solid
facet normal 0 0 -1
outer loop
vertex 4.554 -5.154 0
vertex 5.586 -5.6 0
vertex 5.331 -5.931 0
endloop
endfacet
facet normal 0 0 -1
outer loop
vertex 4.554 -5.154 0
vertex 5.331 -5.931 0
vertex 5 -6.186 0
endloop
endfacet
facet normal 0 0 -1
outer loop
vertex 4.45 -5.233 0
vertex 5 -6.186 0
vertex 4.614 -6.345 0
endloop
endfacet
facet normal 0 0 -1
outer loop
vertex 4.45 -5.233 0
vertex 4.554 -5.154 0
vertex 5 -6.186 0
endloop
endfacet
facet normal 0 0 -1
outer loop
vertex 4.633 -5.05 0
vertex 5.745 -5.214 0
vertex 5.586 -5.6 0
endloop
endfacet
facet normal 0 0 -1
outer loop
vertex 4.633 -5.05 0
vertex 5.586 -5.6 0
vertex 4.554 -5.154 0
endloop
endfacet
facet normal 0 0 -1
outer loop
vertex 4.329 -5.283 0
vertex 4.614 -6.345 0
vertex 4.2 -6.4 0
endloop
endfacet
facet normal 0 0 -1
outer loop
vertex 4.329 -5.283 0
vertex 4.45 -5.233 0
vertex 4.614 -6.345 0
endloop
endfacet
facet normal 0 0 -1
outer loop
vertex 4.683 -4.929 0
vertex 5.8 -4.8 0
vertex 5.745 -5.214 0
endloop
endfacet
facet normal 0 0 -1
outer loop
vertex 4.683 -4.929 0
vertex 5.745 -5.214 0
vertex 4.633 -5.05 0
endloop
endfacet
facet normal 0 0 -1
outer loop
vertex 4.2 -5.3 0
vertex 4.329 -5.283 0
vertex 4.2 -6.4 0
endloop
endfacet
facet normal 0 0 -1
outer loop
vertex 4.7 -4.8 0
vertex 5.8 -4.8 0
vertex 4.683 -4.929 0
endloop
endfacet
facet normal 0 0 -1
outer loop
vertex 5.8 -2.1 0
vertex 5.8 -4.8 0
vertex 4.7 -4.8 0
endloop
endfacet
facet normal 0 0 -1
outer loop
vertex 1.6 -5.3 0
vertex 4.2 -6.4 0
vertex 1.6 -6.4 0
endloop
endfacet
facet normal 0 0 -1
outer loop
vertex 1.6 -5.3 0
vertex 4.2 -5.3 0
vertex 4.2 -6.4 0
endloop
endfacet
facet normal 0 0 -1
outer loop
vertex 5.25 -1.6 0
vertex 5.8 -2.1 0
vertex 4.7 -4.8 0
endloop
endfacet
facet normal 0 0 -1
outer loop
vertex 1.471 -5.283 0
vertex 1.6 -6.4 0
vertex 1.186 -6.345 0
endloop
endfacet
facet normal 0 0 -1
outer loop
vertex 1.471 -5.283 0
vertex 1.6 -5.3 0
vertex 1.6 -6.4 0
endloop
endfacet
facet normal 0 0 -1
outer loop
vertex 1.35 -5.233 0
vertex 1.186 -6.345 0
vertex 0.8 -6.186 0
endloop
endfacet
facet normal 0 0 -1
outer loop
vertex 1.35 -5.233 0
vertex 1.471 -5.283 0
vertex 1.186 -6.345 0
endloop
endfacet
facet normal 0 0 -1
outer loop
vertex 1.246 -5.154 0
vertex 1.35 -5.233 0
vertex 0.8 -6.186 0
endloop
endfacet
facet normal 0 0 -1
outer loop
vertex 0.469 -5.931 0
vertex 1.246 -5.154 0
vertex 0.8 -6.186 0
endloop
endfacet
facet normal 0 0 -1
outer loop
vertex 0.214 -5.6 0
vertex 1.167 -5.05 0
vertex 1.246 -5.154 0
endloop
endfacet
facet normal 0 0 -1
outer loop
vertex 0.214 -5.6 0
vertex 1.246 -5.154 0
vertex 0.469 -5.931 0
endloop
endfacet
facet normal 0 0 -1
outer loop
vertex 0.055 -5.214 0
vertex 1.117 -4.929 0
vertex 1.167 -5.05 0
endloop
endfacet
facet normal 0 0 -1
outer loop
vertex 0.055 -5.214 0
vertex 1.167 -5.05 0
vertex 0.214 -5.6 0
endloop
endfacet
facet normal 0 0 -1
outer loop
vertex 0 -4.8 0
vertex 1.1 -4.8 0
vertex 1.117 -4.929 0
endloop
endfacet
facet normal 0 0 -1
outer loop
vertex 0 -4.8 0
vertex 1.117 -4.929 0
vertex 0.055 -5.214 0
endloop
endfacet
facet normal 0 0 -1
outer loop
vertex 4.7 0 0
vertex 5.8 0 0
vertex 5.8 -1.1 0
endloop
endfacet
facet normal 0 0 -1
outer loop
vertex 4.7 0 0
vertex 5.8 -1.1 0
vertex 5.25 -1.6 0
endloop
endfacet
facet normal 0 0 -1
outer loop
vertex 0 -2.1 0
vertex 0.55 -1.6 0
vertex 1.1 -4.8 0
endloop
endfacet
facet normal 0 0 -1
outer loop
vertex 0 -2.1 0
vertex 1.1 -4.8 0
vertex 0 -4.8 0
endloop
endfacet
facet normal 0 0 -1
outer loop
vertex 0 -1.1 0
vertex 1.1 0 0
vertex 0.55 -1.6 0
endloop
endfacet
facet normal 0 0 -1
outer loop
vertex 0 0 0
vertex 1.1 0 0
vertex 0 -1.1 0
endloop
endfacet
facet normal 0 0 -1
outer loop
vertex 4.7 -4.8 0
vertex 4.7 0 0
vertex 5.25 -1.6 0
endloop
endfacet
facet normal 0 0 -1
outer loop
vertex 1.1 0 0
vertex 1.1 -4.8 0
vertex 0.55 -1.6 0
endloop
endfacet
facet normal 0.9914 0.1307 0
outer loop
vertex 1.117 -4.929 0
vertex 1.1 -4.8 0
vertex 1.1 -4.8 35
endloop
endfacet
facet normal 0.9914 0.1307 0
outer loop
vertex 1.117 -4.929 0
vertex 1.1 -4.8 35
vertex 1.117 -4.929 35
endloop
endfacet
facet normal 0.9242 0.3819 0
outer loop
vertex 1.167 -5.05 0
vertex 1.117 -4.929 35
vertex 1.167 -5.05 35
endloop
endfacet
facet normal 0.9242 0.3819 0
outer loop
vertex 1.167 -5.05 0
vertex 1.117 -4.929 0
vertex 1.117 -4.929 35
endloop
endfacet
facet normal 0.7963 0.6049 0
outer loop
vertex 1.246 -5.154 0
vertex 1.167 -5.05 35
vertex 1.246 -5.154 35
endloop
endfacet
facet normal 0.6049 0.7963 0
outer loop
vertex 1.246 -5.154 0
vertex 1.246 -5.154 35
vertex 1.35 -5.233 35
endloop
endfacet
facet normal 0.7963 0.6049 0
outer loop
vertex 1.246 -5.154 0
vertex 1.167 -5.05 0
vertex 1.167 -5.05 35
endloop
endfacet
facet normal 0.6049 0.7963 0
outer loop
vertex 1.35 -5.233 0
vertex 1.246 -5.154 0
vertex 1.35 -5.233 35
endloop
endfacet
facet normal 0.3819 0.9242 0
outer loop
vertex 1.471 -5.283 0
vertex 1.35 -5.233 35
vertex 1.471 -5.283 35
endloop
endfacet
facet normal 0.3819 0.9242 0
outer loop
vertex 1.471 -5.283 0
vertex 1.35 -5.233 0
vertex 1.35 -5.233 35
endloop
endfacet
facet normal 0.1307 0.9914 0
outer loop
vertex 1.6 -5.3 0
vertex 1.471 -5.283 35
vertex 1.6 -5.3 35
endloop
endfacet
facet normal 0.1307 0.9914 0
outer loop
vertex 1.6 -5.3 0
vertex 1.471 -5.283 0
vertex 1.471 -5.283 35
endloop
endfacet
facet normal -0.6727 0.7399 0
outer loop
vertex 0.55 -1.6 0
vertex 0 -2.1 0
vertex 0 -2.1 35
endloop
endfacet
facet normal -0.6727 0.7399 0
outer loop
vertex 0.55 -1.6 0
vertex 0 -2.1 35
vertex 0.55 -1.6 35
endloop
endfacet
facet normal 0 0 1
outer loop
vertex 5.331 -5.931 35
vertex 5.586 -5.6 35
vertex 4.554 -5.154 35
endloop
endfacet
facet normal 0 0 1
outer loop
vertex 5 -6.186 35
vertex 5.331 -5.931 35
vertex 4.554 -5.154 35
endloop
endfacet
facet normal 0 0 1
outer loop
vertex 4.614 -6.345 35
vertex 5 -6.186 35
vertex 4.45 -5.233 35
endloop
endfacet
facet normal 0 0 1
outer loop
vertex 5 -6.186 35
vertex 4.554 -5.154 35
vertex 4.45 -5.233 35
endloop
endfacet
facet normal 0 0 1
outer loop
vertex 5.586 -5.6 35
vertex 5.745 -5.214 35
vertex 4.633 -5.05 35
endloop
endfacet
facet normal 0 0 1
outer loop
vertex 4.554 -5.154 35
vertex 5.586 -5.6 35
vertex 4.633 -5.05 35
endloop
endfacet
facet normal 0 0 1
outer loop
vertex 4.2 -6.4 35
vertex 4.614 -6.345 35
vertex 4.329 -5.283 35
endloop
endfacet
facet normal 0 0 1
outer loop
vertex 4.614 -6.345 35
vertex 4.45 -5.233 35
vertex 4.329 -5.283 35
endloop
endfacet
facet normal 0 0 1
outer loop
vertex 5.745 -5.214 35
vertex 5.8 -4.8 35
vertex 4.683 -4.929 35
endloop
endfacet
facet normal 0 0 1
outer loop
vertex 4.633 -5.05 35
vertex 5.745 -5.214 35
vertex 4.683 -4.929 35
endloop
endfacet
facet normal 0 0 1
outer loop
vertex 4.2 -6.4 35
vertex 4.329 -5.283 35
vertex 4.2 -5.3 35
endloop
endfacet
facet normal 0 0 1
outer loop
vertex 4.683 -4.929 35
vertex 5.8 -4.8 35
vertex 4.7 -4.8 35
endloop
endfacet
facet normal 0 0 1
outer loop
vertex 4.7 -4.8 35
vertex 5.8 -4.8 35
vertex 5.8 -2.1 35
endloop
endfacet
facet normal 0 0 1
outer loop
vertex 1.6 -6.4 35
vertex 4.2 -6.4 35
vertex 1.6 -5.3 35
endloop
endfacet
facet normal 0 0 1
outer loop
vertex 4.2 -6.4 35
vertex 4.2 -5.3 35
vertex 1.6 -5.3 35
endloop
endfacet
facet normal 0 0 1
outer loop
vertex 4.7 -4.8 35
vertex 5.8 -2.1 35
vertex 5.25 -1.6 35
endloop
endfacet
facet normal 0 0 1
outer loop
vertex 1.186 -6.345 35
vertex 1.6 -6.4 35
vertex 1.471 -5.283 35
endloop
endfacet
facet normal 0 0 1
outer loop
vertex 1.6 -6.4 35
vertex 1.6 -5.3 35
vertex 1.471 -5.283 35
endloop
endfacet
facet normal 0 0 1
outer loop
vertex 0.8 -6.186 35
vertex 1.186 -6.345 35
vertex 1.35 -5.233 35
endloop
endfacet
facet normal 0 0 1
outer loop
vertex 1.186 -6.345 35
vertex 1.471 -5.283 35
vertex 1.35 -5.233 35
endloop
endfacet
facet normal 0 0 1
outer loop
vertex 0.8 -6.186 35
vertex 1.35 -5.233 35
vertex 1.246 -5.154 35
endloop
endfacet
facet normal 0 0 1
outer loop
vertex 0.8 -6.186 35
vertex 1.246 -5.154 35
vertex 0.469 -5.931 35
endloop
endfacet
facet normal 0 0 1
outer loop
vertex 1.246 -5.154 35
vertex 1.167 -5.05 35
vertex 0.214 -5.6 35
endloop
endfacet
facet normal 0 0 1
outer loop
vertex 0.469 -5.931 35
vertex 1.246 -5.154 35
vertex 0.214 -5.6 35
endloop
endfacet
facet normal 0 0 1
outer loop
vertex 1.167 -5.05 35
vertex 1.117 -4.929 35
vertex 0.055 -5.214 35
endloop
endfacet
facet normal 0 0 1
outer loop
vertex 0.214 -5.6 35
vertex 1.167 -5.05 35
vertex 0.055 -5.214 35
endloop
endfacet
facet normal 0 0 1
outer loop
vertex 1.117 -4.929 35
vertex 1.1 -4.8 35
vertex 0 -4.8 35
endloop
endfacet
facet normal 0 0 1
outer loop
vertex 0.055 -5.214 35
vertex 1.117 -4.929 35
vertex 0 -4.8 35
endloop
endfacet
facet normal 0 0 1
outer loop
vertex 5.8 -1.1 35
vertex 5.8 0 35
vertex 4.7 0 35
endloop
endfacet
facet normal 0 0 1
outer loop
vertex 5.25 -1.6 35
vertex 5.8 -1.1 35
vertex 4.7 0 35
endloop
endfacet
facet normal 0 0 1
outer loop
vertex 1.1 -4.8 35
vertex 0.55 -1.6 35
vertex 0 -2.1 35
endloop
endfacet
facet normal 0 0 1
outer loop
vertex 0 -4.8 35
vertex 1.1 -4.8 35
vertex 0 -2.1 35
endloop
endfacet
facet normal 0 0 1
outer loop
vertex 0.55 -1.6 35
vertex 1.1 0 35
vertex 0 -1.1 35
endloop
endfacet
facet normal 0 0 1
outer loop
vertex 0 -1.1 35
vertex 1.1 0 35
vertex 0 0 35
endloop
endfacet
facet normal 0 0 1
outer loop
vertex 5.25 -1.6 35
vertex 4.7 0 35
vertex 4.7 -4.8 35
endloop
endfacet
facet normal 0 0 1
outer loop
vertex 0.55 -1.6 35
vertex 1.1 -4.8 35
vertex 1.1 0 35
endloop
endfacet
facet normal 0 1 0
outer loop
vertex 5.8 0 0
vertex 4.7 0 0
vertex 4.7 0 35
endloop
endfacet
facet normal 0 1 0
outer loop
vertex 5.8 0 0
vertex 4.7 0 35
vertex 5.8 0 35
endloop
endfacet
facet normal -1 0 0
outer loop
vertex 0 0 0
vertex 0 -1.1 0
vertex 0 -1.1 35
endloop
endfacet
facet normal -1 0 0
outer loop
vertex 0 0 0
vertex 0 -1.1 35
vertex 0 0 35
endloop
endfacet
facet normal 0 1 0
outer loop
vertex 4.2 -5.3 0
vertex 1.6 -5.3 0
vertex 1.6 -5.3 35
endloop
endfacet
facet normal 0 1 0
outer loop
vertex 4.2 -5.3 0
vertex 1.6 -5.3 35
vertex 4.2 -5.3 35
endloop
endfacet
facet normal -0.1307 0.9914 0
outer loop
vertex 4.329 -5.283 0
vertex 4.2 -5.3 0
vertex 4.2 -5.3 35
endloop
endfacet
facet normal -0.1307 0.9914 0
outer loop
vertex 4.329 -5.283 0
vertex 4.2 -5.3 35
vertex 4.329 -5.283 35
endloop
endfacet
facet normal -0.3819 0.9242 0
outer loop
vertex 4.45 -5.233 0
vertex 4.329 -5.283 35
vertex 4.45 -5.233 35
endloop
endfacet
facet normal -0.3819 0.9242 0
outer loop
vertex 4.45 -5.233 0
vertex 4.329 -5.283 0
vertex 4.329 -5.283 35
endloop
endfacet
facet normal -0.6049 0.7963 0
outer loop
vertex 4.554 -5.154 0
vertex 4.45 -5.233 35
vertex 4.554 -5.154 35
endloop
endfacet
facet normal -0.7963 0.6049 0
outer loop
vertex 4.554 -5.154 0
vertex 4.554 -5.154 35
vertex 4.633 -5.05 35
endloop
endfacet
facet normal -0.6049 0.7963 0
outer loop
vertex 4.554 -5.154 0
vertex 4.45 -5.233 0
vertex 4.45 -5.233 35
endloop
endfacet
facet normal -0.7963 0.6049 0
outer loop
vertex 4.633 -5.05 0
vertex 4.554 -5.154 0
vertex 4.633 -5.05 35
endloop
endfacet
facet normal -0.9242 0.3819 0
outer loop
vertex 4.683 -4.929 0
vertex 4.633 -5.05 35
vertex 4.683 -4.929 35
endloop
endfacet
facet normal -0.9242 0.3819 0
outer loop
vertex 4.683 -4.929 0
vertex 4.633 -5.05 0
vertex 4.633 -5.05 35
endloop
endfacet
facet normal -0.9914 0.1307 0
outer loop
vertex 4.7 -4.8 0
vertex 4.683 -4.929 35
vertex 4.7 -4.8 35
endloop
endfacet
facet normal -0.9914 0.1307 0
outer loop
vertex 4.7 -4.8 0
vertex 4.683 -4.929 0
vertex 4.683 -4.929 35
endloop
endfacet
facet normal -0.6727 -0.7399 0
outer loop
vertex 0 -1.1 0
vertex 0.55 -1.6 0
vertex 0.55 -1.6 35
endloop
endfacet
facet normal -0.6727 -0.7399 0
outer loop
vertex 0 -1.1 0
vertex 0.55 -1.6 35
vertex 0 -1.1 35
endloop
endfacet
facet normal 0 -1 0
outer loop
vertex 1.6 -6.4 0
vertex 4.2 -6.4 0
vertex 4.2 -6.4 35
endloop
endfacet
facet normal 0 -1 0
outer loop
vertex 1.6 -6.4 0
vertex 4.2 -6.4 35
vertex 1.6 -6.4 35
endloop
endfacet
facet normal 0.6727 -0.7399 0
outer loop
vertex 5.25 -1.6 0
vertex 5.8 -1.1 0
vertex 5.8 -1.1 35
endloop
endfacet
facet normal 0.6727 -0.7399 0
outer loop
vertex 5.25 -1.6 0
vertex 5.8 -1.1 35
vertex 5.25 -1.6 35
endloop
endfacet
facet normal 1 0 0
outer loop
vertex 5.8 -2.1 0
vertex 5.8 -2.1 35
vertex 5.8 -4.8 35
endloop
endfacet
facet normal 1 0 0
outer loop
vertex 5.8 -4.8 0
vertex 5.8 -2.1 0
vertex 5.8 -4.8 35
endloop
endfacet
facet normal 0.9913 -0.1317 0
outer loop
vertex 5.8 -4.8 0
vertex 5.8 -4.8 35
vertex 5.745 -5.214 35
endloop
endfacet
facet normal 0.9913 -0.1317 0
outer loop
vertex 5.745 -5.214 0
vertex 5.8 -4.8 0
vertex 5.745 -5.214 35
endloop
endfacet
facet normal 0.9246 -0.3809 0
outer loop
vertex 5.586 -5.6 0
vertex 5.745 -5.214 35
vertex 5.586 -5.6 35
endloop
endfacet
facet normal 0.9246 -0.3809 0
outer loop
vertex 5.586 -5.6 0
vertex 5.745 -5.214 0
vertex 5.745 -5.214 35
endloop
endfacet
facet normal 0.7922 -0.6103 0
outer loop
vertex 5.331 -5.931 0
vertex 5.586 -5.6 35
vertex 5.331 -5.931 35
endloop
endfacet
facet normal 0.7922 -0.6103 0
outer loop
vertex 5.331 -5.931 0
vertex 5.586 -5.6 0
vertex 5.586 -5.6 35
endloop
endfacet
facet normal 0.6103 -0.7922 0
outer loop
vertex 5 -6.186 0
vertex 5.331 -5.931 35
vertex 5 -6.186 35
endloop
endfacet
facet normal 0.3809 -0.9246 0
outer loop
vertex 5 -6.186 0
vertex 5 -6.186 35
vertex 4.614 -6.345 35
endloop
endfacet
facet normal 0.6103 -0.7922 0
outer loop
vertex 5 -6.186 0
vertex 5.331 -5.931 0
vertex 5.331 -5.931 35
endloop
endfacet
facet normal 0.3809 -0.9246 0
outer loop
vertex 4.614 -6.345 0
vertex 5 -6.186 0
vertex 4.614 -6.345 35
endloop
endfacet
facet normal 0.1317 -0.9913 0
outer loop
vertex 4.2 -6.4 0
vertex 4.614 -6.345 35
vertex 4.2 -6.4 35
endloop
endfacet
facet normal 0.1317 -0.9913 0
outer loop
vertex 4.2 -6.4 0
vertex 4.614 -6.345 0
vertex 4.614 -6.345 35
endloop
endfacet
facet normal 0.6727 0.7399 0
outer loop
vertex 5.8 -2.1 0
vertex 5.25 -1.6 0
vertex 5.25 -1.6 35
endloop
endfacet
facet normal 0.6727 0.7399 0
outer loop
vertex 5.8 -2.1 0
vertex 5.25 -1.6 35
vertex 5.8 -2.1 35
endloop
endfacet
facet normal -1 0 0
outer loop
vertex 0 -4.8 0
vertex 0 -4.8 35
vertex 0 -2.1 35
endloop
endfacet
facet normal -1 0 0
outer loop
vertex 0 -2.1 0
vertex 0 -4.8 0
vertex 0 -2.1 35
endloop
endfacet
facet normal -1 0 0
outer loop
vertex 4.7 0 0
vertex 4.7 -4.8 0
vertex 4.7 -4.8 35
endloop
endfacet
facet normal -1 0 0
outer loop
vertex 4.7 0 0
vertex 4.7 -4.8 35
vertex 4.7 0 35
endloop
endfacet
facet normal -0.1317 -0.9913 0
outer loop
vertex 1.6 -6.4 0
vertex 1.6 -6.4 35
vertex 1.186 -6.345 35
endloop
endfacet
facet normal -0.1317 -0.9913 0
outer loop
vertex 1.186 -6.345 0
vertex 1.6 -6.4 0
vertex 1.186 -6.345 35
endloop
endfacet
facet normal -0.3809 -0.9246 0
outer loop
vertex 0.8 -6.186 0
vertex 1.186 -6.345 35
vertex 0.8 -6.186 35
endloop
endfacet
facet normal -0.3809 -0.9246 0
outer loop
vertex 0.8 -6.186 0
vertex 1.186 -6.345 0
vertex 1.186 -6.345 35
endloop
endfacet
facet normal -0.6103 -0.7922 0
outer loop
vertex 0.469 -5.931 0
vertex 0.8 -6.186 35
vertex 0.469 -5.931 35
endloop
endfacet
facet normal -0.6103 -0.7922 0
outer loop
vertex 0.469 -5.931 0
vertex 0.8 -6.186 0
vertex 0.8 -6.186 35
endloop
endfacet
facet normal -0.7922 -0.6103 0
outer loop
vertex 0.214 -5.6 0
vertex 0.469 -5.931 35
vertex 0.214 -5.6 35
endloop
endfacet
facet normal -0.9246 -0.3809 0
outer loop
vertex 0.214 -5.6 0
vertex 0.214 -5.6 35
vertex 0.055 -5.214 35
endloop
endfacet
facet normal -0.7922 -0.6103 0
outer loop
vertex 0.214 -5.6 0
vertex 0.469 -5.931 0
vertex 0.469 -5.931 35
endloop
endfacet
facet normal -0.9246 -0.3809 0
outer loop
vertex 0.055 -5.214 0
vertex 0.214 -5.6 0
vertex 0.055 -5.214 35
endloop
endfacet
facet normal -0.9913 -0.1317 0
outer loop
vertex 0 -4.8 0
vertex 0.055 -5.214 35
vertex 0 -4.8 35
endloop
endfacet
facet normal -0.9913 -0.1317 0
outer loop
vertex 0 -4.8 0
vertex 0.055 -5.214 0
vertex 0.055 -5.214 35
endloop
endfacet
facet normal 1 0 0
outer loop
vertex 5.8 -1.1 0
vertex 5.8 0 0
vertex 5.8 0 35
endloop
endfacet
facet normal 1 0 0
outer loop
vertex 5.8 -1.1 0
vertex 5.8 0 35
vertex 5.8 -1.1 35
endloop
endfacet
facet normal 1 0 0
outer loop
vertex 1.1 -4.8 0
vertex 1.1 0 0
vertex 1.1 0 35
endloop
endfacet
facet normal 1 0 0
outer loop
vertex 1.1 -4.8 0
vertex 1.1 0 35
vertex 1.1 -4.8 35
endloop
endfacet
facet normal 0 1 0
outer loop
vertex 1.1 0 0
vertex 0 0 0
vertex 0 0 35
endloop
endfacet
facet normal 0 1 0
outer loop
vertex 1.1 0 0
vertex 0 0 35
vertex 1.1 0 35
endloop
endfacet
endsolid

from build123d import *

# Parameters (mm, degrees)
EXTRUSION1_DEPTH = 35


with BuildPart() as part:
    # Esquisse1 → Extrusion1 (new body)
    with BuildSketch(Plane.XY):
        with BuildLine():
            Line((4.7, -4.8), (4.7, 0))
            Line((4.7, 0), (5.8, 0))
            Line((5.8, 0), (5.8, -1.1))
            Line((5.8, -1.1), (5.25, -1.6))
            Line((5.25, -1.6), (5.8, -2.1))
            Line((5.8, -2.1), (5.8, -4.8))
            ThreePointArc((5.8, -4.8), (5.33137085, -5.93137085), (4.2, -6.4))
            Line((4.2, -6.4), (1.6, -6.4))
            ThreePointArc((1.6, -6.4), (0.46862915, -5.93137085), (0, -4.8))
            Line((0, -4.8), (0, -2.1))
            Line((0, -2.1), (0.55, -1.6))
            Line((0.55, -1.6), (0, -1.1))
            Line((0, -1.1), (0, 0))
            Line((0, 0), (1.1, 0))
            Line((1.1, 0), (1.1, -4.8))
            ThreePointArc((1.1, -4.8), (1.246446609, -5.153553391), (1.6, -5.3))
            Line((1.6, -5.3), (4.2, -5.3))
            ThreePointArc((4.2, -5.3), (4.553553391, -5.153553391), (4.7, -4.8))
        make_face()
    extrude(amount=EXTRUSION1_DEPTH)


solid = part.part
